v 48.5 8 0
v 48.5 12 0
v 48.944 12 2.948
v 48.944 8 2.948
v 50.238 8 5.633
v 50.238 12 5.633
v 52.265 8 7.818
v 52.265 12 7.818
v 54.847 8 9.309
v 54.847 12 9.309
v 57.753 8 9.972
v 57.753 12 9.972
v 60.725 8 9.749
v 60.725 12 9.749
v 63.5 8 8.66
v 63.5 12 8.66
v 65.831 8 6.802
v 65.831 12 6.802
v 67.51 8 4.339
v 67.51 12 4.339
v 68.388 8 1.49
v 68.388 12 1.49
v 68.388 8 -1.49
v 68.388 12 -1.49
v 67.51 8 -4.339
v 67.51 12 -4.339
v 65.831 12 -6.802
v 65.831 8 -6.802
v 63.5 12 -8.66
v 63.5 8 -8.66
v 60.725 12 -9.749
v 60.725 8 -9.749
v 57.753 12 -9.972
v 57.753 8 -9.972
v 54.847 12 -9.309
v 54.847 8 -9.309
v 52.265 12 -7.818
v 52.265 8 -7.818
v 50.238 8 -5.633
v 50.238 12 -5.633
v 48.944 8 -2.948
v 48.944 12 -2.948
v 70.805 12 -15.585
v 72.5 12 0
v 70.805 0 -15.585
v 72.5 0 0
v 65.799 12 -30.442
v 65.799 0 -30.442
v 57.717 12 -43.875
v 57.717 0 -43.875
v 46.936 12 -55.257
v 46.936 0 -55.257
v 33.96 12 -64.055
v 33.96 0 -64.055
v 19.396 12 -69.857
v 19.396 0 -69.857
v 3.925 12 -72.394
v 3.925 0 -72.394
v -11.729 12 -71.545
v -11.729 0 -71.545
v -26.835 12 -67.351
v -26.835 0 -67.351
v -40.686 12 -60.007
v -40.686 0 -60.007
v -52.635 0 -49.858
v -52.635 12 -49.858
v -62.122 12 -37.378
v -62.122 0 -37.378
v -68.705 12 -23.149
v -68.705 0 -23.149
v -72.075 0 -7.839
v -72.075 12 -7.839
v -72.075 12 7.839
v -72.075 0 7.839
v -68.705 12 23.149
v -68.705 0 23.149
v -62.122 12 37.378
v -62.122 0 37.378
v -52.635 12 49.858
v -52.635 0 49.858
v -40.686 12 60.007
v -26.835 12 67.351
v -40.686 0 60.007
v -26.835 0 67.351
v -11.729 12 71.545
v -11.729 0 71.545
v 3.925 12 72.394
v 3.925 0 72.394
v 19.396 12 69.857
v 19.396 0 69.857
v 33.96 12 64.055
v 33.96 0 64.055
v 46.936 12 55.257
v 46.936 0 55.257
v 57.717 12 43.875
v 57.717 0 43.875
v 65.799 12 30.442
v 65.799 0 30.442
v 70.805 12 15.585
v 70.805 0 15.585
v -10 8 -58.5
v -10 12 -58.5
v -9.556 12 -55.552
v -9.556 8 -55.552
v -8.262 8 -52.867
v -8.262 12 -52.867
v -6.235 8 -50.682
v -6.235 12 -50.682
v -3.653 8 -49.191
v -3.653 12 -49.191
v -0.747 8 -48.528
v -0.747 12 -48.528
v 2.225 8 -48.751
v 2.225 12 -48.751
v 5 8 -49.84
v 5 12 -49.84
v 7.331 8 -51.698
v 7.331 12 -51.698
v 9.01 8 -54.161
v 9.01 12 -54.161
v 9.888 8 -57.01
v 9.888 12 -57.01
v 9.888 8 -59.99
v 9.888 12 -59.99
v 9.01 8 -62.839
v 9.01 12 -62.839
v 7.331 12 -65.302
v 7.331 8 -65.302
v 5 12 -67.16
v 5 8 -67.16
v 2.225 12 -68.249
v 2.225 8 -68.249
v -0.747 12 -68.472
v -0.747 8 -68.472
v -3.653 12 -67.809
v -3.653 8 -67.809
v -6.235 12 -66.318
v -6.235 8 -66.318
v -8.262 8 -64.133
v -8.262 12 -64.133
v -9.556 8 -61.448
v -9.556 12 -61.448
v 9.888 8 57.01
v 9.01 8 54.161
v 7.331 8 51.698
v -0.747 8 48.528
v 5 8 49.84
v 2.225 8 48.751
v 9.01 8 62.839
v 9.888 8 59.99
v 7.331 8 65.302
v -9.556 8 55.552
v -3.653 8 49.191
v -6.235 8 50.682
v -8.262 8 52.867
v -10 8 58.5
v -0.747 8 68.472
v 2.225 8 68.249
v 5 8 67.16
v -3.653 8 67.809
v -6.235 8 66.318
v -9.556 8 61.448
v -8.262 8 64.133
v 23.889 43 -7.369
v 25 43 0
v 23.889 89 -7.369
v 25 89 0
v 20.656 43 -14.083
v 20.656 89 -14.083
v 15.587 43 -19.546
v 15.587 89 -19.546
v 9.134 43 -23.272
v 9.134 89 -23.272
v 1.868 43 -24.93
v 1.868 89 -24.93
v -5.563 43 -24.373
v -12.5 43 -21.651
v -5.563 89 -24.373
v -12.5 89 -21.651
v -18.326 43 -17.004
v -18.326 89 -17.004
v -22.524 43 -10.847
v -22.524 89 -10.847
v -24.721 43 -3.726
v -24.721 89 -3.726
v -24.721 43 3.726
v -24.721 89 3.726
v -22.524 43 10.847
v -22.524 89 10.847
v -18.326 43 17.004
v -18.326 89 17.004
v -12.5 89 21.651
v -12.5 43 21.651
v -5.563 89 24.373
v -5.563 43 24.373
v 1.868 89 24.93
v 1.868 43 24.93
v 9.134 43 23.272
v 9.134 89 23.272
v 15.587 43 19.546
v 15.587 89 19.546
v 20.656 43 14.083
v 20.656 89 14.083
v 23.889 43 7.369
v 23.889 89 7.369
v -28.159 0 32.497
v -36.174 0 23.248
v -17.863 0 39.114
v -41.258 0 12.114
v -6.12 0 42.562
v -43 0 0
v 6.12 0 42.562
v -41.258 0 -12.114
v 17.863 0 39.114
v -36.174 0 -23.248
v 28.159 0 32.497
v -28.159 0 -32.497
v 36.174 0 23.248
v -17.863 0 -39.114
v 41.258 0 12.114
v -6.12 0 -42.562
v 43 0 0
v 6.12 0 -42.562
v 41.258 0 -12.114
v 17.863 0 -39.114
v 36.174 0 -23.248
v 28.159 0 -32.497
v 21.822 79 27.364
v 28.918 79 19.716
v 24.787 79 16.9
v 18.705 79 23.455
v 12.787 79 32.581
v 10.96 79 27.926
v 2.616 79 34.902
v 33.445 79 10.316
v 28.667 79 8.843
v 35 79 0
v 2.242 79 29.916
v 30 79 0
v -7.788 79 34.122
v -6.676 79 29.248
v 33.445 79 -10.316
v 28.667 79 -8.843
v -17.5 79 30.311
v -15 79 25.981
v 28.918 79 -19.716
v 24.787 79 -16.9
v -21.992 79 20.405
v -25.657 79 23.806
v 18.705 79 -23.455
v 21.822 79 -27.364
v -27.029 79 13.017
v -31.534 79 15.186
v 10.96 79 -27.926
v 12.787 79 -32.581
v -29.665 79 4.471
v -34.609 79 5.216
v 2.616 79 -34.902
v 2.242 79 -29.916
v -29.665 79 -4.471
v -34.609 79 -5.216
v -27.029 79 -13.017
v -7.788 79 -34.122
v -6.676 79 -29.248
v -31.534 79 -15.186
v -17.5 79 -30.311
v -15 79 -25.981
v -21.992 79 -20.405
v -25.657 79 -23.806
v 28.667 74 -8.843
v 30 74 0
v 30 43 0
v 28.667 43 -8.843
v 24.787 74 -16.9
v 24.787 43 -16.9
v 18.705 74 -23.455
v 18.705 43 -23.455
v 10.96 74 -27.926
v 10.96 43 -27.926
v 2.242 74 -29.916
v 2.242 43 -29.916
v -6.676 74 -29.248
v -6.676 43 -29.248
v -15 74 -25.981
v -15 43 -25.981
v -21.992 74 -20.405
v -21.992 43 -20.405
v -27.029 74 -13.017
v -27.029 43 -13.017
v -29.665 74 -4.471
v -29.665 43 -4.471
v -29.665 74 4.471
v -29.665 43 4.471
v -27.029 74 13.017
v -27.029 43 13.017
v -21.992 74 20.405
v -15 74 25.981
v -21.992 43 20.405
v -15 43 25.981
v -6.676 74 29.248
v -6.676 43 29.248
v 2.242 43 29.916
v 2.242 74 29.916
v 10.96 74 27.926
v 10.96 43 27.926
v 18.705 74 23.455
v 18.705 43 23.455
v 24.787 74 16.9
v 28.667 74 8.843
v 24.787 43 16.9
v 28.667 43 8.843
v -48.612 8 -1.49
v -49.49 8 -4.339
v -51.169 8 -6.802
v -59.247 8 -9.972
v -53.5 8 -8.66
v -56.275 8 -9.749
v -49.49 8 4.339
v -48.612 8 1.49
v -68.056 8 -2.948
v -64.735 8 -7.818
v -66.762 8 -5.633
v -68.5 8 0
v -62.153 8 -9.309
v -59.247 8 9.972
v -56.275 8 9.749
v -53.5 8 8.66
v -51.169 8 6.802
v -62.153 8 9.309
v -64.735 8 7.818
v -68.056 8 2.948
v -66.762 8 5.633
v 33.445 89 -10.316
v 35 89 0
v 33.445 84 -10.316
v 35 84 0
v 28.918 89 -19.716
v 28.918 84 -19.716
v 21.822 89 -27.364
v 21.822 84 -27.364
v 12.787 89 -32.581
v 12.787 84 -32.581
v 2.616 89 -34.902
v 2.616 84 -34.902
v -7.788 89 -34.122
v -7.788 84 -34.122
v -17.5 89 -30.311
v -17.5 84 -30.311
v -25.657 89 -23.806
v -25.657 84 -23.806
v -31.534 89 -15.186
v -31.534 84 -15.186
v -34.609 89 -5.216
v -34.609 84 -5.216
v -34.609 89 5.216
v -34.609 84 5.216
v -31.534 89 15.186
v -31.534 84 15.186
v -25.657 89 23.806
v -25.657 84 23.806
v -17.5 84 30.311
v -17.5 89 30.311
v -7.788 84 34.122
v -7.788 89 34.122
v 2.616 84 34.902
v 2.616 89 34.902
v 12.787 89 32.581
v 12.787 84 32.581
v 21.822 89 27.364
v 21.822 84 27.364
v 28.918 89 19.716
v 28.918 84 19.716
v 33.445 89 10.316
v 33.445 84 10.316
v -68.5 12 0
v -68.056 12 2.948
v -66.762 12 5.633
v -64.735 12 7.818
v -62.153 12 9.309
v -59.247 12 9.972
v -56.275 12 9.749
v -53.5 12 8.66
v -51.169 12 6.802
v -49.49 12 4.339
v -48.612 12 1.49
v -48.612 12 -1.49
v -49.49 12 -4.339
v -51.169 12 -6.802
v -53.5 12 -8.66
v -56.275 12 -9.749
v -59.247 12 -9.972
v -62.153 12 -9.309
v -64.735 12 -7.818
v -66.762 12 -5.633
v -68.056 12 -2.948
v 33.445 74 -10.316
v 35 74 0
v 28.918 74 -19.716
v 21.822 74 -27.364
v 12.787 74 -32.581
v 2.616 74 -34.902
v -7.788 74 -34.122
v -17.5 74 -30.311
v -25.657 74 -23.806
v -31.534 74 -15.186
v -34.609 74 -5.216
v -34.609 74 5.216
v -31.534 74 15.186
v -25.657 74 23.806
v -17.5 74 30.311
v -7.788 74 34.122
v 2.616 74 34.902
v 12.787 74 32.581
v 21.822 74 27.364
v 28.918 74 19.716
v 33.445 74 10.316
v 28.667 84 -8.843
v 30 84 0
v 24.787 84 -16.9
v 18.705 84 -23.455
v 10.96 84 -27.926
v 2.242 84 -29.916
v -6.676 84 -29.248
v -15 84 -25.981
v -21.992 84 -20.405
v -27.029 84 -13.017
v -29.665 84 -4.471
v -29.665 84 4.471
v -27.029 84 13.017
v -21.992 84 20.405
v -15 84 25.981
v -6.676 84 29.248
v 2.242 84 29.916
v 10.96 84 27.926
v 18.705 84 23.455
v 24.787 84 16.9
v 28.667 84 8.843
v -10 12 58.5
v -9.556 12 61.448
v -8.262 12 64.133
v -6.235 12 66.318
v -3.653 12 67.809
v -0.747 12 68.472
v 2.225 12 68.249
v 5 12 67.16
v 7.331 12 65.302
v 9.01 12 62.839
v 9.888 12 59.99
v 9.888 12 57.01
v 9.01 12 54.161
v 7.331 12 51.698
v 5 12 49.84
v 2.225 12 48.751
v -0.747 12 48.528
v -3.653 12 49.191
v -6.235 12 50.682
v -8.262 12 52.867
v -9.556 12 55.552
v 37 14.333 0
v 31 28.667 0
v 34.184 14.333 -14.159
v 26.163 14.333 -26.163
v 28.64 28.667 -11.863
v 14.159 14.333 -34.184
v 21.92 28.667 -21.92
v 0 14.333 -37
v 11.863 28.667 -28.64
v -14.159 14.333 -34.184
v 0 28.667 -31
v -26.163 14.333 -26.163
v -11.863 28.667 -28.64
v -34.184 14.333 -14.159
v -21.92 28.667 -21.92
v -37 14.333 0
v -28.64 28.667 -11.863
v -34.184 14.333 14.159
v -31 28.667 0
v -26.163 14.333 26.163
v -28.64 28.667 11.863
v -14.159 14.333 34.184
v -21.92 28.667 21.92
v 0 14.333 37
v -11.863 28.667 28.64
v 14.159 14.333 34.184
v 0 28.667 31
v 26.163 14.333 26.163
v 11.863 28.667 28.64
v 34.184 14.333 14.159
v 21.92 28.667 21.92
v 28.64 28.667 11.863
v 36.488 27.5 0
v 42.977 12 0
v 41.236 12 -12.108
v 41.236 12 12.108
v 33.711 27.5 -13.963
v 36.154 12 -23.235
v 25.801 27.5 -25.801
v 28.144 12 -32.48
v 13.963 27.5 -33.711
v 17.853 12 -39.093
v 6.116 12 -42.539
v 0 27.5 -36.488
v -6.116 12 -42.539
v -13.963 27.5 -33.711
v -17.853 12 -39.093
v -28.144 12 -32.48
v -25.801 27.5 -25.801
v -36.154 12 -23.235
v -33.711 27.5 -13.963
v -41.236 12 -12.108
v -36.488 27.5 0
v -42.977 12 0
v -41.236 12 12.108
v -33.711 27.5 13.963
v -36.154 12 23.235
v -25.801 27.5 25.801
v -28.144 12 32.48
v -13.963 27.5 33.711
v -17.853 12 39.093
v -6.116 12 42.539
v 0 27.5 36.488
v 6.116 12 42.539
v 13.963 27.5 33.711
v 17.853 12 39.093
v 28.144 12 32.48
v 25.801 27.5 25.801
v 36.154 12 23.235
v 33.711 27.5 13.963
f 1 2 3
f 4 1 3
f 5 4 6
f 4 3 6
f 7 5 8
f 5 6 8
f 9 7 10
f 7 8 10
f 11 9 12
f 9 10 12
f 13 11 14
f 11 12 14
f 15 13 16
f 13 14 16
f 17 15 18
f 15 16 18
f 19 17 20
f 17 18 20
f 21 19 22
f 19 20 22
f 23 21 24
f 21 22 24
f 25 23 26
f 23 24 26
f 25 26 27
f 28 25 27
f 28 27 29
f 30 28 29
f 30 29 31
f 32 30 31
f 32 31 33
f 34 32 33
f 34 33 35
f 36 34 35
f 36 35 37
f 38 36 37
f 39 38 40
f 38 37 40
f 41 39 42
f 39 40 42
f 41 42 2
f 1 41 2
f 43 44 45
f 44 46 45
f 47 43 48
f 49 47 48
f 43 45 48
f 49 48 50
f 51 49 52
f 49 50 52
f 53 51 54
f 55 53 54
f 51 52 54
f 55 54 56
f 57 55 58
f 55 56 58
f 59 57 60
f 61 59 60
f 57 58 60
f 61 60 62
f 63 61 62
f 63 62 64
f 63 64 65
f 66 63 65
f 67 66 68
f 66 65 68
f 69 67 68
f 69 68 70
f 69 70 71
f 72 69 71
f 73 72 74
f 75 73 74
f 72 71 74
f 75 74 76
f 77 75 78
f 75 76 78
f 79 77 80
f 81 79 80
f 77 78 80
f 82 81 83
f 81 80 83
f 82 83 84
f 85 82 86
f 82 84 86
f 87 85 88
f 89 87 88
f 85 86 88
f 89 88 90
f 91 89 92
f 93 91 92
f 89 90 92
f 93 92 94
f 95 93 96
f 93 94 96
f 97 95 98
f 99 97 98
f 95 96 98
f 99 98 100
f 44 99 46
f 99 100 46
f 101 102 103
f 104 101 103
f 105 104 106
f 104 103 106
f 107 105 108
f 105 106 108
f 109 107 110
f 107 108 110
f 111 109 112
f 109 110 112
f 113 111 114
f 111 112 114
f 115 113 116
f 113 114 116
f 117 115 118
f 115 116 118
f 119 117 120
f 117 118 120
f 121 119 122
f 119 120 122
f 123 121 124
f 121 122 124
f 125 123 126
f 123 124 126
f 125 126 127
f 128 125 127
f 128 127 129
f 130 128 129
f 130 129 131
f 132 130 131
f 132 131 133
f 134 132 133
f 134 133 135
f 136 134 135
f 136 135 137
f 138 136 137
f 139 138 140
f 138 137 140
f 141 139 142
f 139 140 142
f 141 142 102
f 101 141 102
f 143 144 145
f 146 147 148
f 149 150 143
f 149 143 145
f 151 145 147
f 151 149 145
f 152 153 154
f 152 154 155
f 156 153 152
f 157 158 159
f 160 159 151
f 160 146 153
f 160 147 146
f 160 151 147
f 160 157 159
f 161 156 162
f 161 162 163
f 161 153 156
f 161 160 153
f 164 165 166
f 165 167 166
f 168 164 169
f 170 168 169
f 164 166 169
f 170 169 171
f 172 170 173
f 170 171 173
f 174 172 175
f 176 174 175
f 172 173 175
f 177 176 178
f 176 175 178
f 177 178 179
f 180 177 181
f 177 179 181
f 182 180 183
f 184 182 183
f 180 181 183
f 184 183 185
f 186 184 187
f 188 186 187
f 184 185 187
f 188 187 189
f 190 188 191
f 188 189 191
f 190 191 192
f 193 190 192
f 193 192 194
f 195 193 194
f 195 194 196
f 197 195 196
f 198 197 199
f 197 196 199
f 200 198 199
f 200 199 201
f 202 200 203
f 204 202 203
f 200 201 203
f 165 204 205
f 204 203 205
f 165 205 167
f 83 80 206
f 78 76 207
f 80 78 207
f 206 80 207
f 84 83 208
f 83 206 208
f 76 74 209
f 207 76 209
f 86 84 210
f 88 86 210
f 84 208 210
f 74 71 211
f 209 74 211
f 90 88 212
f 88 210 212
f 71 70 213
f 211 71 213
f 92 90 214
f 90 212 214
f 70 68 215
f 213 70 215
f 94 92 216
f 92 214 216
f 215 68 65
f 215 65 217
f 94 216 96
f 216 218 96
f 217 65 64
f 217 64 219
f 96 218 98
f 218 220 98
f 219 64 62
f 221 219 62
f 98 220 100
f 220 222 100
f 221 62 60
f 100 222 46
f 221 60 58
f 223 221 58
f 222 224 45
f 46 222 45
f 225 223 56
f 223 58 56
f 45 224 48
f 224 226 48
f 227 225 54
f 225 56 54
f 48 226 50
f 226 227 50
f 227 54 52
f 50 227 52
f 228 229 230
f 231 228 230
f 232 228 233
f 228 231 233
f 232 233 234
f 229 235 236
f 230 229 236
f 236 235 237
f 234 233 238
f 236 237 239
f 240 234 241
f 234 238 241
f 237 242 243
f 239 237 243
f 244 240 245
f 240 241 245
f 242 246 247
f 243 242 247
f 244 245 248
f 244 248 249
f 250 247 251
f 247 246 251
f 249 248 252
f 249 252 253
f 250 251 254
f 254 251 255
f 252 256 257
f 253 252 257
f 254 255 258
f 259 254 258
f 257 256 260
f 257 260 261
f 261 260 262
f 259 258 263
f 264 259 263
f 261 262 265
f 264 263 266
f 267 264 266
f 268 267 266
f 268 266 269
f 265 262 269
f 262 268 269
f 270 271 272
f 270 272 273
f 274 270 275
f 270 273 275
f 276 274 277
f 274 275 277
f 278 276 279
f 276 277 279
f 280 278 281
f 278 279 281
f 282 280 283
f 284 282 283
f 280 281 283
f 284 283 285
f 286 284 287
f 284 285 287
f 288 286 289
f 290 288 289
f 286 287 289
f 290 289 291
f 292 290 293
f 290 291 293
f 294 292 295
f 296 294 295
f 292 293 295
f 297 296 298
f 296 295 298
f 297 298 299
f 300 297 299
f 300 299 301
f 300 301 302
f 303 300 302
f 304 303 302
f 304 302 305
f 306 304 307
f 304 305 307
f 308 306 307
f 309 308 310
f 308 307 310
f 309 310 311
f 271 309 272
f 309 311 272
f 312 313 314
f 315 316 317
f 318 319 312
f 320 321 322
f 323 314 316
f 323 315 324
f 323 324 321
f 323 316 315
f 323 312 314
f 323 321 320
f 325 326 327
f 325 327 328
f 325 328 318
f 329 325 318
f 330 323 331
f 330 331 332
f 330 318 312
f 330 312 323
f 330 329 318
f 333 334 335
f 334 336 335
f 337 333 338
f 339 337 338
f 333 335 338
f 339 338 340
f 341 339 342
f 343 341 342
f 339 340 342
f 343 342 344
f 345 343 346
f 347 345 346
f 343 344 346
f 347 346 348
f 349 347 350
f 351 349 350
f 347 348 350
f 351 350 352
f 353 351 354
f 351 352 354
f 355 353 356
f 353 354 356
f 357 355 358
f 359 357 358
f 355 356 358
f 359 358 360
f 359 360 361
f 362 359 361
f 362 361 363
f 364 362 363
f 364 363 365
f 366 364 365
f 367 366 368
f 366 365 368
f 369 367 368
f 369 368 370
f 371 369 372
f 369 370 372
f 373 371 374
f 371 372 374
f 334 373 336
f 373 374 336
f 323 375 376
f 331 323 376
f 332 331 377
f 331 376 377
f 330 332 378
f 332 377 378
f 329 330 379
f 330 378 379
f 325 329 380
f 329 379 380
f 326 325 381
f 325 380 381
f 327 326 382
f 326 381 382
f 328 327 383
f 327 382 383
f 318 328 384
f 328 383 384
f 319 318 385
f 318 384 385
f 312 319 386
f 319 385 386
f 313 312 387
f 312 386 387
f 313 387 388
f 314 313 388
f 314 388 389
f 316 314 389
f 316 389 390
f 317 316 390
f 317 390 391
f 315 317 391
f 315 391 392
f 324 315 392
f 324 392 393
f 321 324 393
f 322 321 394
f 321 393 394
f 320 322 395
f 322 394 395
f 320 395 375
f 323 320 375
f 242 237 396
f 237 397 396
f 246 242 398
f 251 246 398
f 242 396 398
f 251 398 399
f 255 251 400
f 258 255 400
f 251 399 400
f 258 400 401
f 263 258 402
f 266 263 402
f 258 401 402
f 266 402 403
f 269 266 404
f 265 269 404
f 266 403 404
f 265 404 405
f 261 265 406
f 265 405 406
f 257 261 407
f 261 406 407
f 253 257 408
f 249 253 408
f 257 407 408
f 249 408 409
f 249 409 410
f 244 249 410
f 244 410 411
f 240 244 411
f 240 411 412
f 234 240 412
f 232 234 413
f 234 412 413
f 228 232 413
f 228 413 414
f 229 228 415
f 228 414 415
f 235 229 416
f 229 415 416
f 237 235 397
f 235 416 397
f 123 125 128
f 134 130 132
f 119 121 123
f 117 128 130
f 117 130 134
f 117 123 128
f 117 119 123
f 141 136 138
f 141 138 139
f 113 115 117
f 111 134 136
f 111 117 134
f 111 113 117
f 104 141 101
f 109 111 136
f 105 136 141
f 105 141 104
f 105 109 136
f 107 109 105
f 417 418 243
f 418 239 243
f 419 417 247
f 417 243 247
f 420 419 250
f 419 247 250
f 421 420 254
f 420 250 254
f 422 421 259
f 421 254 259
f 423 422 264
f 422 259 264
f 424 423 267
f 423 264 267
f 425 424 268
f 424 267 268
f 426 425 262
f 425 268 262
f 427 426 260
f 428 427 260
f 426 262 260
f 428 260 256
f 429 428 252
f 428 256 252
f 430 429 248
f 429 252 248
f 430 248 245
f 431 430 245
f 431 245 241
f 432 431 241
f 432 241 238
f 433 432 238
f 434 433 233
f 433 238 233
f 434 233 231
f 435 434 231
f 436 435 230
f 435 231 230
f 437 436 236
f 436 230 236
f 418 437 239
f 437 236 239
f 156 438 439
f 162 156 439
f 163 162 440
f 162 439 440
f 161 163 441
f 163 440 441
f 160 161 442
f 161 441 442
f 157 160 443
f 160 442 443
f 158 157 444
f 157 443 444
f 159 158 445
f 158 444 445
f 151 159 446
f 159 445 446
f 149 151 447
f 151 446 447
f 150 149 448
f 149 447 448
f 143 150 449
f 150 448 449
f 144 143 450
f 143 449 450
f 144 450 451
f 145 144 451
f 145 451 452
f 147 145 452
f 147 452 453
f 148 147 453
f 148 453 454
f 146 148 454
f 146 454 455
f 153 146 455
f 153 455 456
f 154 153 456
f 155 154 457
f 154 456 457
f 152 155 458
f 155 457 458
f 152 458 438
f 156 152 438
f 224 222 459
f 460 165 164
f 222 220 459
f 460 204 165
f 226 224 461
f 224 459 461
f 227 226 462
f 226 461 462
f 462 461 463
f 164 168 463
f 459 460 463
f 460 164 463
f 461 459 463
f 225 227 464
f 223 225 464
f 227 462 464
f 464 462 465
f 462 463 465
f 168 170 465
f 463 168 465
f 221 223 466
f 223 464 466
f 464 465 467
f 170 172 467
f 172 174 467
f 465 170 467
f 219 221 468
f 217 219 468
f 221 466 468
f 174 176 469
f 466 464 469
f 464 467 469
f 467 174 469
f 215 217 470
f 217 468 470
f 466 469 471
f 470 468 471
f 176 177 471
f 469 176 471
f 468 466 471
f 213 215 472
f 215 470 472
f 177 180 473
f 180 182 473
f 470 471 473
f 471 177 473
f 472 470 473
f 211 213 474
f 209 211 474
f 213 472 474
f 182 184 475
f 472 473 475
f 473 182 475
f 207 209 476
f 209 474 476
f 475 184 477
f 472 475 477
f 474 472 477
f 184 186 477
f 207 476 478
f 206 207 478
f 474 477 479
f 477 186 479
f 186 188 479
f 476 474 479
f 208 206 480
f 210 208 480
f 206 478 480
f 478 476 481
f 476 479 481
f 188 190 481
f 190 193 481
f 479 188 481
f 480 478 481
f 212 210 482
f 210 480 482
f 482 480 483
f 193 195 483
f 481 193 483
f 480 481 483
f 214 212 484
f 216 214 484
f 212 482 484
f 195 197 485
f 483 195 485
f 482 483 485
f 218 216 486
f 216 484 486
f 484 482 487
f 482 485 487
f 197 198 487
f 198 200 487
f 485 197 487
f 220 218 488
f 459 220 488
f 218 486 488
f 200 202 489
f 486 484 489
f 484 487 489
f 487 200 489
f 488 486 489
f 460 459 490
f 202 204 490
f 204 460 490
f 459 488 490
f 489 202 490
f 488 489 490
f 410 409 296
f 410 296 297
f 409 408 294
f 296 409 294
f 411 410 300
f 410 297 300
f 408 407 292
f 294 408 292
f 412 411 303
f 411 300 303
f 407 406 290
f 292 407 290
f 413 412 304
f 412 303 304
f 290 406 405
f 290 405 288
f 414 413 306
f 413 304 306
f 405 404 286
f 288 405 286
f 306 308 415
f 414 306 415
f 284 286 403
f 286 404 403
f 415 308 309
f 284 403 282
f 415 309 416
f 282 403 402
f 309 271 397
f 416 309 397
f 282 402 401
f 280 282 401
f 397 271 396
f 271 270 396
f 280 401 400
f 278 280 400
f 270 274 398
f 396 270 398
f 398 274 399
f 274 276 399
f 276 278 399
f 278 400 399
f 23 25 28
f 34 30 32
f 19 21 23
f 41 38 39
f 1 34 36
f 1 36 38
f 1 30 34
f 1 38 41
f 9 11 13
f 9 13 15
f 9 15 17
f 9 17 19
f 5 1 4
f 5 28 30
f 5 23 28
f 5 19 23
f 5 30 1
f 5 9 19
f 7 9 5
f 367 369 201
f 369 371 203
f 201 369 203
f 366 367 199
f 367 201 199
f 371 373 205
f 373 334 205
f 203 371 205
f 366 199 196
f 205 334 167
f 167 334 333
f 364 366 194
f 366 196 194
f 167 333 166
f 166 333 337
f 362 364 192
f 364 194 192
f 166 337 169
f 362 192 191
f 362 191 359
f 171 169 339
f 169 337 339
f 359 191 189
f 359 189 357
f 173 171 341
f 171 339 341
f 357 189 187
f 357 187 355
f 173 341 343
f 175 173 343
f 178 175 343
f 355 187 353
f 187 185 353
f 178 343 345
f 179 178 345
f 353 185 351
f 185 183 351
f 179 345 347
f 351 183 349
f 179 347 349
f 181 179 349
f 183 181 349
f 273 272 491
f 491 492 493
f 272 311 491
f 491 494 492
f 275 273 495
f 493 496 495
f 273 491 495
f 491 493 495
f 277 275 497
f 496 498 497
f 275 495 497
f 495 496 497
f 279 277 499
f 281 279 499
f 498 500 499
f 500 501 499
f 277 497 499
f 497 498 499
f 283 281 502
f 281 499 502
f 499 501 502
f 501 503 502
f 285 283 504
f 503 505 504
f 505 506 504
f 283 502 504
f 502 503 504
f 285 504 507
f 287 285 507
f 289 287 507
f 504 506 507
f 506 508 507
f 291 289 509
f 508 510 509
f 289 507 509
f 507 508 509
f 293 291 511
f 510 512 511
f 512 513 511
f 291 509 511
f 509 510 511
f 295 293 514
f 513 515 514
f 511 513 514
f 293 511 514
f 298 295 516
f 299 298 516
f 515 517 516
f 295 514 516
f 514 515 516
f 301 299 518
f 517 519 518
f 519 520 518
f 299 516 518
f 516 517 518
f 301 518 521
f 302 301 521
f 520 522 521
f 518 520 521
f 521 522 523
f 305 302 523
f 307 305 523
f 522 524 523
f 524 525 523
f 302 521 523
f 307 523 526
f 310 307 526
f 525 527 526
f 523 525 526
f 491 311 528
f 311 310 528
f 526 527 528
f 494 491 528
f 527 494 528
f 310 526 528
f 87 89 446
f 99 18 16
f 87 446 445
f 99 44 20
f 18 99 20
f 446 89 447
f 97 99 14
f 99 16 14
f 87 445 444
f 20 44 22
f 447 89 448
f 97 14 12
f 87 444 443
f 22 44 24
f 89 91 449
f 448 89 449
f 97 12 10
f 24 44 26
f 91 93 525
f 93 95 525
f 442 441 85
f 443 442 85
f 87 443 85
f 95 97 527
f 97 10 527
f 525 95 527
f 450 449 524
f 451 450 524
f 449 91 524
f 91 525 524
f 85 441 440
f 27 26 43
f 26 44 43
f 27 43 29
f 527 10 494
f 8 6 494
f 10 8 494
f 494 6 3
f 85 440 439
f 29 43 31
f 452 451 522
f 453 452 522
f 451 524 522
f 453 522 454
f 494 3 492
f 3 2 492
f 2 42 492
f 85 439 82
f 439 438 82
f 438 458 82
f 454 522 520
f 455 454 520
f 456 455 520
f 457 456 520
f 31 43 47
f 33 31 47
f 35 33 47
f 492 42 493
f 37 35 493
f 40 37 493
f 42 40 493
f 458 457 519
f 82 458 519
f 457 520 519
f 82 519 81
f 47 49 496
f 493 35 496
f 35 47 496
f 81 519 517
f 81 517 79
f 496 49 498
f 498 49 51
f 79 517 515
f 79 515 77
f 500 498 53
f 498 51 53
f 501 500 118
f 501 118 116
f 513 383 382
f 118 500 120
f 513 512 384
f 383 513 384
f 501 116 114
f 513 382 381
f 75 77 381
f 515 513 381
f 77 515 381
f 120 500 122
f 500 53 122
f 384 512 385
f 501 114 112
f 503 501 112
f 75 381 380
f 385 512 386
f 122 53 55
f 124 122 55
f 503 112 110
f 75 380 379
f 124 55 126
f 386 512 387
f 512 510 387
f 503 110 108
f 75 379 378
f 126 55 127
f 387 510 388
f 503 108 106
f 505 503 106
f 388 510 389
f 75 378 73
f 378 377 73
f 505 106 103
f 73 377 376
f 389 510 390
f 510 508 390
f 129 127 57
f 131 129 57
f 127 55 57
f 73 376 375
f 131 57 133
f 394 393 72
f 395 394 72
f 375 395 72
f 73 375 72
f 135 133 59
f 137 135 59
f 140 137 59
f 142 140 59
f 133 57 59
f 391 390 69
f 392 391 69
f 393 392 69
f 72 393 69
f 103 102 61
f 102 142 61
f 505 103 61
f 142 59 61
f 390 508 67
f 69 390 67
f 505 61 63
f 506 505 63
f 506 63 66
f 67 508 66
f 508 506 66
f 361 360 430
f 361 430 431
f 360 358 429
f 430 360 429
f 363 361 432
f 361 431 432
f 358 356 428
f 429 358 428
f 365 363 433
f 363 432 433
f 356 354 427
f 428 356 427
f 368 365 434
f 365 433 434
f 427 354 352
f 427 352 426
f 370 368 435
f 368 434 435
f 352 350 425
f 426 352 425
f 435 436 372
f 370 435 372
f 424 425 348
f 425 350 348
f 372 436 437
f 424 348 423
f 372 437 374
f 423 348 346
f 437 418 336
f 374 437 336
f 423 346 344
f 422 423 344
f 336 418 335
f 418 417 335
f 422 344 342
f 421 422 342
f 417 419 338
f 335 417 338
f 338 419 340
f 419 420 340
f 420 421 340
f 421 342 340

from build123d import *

# Parameters (mm, degrees)
SKETCH5_R          = 10
CUT_EXTRUDE1_DEPTH = 4


with BuildPart() as part:
    # Sketch1 → Revolve1 (revolve)
    with BuildSketch(Plane.XY, mode=Mode.PRIVATE) as revolve1_sk:
        Polygon((-25, 89), (-35, 89), (-35, 84), (-30, 84), (-30, 79), (-35, 79), (-35, 74), (-30, 74), (-30, 43), (-42.976744186, 12), (-72.5, 12), (-72.5, 0), (-43, 0), (-25, 43), align=None)
    revolve(revolve1_sk.sketch.rotate(Axis((0, 0, 0), (0, 1, 0)), 180), axis=Axis((0, 0, 0), (0, 1, 0)))

    # Sketch5 → Cut-Extrude1 (cut)
    with BuildSketch(Plane(origin=(0, 12, 0), x_dir=(1, 0, 0), z_dir=(0, 1, 0))):
        with Locations(Location((0, 58.5, 0), (0, 0, 180))):
            Circle(SKETCH5_R)
        with Locations(Location((58.5, 0, 0), (0, 0, 180))):
            Circle(SKETCH5_R)
        with Locations(Location((0, -58.5, 0), (0, 0, 180))):
            Circle(SKETCH5_R)
        with Locations(Location((-58.5, 0, 0), (0, 0, 180))):
            Circle(SKETCH5_R)
    extrude(amount=-CUT_EXTRUDE1_DEPTH, mode=Mode.SUBTRACT)


solid = part.part
